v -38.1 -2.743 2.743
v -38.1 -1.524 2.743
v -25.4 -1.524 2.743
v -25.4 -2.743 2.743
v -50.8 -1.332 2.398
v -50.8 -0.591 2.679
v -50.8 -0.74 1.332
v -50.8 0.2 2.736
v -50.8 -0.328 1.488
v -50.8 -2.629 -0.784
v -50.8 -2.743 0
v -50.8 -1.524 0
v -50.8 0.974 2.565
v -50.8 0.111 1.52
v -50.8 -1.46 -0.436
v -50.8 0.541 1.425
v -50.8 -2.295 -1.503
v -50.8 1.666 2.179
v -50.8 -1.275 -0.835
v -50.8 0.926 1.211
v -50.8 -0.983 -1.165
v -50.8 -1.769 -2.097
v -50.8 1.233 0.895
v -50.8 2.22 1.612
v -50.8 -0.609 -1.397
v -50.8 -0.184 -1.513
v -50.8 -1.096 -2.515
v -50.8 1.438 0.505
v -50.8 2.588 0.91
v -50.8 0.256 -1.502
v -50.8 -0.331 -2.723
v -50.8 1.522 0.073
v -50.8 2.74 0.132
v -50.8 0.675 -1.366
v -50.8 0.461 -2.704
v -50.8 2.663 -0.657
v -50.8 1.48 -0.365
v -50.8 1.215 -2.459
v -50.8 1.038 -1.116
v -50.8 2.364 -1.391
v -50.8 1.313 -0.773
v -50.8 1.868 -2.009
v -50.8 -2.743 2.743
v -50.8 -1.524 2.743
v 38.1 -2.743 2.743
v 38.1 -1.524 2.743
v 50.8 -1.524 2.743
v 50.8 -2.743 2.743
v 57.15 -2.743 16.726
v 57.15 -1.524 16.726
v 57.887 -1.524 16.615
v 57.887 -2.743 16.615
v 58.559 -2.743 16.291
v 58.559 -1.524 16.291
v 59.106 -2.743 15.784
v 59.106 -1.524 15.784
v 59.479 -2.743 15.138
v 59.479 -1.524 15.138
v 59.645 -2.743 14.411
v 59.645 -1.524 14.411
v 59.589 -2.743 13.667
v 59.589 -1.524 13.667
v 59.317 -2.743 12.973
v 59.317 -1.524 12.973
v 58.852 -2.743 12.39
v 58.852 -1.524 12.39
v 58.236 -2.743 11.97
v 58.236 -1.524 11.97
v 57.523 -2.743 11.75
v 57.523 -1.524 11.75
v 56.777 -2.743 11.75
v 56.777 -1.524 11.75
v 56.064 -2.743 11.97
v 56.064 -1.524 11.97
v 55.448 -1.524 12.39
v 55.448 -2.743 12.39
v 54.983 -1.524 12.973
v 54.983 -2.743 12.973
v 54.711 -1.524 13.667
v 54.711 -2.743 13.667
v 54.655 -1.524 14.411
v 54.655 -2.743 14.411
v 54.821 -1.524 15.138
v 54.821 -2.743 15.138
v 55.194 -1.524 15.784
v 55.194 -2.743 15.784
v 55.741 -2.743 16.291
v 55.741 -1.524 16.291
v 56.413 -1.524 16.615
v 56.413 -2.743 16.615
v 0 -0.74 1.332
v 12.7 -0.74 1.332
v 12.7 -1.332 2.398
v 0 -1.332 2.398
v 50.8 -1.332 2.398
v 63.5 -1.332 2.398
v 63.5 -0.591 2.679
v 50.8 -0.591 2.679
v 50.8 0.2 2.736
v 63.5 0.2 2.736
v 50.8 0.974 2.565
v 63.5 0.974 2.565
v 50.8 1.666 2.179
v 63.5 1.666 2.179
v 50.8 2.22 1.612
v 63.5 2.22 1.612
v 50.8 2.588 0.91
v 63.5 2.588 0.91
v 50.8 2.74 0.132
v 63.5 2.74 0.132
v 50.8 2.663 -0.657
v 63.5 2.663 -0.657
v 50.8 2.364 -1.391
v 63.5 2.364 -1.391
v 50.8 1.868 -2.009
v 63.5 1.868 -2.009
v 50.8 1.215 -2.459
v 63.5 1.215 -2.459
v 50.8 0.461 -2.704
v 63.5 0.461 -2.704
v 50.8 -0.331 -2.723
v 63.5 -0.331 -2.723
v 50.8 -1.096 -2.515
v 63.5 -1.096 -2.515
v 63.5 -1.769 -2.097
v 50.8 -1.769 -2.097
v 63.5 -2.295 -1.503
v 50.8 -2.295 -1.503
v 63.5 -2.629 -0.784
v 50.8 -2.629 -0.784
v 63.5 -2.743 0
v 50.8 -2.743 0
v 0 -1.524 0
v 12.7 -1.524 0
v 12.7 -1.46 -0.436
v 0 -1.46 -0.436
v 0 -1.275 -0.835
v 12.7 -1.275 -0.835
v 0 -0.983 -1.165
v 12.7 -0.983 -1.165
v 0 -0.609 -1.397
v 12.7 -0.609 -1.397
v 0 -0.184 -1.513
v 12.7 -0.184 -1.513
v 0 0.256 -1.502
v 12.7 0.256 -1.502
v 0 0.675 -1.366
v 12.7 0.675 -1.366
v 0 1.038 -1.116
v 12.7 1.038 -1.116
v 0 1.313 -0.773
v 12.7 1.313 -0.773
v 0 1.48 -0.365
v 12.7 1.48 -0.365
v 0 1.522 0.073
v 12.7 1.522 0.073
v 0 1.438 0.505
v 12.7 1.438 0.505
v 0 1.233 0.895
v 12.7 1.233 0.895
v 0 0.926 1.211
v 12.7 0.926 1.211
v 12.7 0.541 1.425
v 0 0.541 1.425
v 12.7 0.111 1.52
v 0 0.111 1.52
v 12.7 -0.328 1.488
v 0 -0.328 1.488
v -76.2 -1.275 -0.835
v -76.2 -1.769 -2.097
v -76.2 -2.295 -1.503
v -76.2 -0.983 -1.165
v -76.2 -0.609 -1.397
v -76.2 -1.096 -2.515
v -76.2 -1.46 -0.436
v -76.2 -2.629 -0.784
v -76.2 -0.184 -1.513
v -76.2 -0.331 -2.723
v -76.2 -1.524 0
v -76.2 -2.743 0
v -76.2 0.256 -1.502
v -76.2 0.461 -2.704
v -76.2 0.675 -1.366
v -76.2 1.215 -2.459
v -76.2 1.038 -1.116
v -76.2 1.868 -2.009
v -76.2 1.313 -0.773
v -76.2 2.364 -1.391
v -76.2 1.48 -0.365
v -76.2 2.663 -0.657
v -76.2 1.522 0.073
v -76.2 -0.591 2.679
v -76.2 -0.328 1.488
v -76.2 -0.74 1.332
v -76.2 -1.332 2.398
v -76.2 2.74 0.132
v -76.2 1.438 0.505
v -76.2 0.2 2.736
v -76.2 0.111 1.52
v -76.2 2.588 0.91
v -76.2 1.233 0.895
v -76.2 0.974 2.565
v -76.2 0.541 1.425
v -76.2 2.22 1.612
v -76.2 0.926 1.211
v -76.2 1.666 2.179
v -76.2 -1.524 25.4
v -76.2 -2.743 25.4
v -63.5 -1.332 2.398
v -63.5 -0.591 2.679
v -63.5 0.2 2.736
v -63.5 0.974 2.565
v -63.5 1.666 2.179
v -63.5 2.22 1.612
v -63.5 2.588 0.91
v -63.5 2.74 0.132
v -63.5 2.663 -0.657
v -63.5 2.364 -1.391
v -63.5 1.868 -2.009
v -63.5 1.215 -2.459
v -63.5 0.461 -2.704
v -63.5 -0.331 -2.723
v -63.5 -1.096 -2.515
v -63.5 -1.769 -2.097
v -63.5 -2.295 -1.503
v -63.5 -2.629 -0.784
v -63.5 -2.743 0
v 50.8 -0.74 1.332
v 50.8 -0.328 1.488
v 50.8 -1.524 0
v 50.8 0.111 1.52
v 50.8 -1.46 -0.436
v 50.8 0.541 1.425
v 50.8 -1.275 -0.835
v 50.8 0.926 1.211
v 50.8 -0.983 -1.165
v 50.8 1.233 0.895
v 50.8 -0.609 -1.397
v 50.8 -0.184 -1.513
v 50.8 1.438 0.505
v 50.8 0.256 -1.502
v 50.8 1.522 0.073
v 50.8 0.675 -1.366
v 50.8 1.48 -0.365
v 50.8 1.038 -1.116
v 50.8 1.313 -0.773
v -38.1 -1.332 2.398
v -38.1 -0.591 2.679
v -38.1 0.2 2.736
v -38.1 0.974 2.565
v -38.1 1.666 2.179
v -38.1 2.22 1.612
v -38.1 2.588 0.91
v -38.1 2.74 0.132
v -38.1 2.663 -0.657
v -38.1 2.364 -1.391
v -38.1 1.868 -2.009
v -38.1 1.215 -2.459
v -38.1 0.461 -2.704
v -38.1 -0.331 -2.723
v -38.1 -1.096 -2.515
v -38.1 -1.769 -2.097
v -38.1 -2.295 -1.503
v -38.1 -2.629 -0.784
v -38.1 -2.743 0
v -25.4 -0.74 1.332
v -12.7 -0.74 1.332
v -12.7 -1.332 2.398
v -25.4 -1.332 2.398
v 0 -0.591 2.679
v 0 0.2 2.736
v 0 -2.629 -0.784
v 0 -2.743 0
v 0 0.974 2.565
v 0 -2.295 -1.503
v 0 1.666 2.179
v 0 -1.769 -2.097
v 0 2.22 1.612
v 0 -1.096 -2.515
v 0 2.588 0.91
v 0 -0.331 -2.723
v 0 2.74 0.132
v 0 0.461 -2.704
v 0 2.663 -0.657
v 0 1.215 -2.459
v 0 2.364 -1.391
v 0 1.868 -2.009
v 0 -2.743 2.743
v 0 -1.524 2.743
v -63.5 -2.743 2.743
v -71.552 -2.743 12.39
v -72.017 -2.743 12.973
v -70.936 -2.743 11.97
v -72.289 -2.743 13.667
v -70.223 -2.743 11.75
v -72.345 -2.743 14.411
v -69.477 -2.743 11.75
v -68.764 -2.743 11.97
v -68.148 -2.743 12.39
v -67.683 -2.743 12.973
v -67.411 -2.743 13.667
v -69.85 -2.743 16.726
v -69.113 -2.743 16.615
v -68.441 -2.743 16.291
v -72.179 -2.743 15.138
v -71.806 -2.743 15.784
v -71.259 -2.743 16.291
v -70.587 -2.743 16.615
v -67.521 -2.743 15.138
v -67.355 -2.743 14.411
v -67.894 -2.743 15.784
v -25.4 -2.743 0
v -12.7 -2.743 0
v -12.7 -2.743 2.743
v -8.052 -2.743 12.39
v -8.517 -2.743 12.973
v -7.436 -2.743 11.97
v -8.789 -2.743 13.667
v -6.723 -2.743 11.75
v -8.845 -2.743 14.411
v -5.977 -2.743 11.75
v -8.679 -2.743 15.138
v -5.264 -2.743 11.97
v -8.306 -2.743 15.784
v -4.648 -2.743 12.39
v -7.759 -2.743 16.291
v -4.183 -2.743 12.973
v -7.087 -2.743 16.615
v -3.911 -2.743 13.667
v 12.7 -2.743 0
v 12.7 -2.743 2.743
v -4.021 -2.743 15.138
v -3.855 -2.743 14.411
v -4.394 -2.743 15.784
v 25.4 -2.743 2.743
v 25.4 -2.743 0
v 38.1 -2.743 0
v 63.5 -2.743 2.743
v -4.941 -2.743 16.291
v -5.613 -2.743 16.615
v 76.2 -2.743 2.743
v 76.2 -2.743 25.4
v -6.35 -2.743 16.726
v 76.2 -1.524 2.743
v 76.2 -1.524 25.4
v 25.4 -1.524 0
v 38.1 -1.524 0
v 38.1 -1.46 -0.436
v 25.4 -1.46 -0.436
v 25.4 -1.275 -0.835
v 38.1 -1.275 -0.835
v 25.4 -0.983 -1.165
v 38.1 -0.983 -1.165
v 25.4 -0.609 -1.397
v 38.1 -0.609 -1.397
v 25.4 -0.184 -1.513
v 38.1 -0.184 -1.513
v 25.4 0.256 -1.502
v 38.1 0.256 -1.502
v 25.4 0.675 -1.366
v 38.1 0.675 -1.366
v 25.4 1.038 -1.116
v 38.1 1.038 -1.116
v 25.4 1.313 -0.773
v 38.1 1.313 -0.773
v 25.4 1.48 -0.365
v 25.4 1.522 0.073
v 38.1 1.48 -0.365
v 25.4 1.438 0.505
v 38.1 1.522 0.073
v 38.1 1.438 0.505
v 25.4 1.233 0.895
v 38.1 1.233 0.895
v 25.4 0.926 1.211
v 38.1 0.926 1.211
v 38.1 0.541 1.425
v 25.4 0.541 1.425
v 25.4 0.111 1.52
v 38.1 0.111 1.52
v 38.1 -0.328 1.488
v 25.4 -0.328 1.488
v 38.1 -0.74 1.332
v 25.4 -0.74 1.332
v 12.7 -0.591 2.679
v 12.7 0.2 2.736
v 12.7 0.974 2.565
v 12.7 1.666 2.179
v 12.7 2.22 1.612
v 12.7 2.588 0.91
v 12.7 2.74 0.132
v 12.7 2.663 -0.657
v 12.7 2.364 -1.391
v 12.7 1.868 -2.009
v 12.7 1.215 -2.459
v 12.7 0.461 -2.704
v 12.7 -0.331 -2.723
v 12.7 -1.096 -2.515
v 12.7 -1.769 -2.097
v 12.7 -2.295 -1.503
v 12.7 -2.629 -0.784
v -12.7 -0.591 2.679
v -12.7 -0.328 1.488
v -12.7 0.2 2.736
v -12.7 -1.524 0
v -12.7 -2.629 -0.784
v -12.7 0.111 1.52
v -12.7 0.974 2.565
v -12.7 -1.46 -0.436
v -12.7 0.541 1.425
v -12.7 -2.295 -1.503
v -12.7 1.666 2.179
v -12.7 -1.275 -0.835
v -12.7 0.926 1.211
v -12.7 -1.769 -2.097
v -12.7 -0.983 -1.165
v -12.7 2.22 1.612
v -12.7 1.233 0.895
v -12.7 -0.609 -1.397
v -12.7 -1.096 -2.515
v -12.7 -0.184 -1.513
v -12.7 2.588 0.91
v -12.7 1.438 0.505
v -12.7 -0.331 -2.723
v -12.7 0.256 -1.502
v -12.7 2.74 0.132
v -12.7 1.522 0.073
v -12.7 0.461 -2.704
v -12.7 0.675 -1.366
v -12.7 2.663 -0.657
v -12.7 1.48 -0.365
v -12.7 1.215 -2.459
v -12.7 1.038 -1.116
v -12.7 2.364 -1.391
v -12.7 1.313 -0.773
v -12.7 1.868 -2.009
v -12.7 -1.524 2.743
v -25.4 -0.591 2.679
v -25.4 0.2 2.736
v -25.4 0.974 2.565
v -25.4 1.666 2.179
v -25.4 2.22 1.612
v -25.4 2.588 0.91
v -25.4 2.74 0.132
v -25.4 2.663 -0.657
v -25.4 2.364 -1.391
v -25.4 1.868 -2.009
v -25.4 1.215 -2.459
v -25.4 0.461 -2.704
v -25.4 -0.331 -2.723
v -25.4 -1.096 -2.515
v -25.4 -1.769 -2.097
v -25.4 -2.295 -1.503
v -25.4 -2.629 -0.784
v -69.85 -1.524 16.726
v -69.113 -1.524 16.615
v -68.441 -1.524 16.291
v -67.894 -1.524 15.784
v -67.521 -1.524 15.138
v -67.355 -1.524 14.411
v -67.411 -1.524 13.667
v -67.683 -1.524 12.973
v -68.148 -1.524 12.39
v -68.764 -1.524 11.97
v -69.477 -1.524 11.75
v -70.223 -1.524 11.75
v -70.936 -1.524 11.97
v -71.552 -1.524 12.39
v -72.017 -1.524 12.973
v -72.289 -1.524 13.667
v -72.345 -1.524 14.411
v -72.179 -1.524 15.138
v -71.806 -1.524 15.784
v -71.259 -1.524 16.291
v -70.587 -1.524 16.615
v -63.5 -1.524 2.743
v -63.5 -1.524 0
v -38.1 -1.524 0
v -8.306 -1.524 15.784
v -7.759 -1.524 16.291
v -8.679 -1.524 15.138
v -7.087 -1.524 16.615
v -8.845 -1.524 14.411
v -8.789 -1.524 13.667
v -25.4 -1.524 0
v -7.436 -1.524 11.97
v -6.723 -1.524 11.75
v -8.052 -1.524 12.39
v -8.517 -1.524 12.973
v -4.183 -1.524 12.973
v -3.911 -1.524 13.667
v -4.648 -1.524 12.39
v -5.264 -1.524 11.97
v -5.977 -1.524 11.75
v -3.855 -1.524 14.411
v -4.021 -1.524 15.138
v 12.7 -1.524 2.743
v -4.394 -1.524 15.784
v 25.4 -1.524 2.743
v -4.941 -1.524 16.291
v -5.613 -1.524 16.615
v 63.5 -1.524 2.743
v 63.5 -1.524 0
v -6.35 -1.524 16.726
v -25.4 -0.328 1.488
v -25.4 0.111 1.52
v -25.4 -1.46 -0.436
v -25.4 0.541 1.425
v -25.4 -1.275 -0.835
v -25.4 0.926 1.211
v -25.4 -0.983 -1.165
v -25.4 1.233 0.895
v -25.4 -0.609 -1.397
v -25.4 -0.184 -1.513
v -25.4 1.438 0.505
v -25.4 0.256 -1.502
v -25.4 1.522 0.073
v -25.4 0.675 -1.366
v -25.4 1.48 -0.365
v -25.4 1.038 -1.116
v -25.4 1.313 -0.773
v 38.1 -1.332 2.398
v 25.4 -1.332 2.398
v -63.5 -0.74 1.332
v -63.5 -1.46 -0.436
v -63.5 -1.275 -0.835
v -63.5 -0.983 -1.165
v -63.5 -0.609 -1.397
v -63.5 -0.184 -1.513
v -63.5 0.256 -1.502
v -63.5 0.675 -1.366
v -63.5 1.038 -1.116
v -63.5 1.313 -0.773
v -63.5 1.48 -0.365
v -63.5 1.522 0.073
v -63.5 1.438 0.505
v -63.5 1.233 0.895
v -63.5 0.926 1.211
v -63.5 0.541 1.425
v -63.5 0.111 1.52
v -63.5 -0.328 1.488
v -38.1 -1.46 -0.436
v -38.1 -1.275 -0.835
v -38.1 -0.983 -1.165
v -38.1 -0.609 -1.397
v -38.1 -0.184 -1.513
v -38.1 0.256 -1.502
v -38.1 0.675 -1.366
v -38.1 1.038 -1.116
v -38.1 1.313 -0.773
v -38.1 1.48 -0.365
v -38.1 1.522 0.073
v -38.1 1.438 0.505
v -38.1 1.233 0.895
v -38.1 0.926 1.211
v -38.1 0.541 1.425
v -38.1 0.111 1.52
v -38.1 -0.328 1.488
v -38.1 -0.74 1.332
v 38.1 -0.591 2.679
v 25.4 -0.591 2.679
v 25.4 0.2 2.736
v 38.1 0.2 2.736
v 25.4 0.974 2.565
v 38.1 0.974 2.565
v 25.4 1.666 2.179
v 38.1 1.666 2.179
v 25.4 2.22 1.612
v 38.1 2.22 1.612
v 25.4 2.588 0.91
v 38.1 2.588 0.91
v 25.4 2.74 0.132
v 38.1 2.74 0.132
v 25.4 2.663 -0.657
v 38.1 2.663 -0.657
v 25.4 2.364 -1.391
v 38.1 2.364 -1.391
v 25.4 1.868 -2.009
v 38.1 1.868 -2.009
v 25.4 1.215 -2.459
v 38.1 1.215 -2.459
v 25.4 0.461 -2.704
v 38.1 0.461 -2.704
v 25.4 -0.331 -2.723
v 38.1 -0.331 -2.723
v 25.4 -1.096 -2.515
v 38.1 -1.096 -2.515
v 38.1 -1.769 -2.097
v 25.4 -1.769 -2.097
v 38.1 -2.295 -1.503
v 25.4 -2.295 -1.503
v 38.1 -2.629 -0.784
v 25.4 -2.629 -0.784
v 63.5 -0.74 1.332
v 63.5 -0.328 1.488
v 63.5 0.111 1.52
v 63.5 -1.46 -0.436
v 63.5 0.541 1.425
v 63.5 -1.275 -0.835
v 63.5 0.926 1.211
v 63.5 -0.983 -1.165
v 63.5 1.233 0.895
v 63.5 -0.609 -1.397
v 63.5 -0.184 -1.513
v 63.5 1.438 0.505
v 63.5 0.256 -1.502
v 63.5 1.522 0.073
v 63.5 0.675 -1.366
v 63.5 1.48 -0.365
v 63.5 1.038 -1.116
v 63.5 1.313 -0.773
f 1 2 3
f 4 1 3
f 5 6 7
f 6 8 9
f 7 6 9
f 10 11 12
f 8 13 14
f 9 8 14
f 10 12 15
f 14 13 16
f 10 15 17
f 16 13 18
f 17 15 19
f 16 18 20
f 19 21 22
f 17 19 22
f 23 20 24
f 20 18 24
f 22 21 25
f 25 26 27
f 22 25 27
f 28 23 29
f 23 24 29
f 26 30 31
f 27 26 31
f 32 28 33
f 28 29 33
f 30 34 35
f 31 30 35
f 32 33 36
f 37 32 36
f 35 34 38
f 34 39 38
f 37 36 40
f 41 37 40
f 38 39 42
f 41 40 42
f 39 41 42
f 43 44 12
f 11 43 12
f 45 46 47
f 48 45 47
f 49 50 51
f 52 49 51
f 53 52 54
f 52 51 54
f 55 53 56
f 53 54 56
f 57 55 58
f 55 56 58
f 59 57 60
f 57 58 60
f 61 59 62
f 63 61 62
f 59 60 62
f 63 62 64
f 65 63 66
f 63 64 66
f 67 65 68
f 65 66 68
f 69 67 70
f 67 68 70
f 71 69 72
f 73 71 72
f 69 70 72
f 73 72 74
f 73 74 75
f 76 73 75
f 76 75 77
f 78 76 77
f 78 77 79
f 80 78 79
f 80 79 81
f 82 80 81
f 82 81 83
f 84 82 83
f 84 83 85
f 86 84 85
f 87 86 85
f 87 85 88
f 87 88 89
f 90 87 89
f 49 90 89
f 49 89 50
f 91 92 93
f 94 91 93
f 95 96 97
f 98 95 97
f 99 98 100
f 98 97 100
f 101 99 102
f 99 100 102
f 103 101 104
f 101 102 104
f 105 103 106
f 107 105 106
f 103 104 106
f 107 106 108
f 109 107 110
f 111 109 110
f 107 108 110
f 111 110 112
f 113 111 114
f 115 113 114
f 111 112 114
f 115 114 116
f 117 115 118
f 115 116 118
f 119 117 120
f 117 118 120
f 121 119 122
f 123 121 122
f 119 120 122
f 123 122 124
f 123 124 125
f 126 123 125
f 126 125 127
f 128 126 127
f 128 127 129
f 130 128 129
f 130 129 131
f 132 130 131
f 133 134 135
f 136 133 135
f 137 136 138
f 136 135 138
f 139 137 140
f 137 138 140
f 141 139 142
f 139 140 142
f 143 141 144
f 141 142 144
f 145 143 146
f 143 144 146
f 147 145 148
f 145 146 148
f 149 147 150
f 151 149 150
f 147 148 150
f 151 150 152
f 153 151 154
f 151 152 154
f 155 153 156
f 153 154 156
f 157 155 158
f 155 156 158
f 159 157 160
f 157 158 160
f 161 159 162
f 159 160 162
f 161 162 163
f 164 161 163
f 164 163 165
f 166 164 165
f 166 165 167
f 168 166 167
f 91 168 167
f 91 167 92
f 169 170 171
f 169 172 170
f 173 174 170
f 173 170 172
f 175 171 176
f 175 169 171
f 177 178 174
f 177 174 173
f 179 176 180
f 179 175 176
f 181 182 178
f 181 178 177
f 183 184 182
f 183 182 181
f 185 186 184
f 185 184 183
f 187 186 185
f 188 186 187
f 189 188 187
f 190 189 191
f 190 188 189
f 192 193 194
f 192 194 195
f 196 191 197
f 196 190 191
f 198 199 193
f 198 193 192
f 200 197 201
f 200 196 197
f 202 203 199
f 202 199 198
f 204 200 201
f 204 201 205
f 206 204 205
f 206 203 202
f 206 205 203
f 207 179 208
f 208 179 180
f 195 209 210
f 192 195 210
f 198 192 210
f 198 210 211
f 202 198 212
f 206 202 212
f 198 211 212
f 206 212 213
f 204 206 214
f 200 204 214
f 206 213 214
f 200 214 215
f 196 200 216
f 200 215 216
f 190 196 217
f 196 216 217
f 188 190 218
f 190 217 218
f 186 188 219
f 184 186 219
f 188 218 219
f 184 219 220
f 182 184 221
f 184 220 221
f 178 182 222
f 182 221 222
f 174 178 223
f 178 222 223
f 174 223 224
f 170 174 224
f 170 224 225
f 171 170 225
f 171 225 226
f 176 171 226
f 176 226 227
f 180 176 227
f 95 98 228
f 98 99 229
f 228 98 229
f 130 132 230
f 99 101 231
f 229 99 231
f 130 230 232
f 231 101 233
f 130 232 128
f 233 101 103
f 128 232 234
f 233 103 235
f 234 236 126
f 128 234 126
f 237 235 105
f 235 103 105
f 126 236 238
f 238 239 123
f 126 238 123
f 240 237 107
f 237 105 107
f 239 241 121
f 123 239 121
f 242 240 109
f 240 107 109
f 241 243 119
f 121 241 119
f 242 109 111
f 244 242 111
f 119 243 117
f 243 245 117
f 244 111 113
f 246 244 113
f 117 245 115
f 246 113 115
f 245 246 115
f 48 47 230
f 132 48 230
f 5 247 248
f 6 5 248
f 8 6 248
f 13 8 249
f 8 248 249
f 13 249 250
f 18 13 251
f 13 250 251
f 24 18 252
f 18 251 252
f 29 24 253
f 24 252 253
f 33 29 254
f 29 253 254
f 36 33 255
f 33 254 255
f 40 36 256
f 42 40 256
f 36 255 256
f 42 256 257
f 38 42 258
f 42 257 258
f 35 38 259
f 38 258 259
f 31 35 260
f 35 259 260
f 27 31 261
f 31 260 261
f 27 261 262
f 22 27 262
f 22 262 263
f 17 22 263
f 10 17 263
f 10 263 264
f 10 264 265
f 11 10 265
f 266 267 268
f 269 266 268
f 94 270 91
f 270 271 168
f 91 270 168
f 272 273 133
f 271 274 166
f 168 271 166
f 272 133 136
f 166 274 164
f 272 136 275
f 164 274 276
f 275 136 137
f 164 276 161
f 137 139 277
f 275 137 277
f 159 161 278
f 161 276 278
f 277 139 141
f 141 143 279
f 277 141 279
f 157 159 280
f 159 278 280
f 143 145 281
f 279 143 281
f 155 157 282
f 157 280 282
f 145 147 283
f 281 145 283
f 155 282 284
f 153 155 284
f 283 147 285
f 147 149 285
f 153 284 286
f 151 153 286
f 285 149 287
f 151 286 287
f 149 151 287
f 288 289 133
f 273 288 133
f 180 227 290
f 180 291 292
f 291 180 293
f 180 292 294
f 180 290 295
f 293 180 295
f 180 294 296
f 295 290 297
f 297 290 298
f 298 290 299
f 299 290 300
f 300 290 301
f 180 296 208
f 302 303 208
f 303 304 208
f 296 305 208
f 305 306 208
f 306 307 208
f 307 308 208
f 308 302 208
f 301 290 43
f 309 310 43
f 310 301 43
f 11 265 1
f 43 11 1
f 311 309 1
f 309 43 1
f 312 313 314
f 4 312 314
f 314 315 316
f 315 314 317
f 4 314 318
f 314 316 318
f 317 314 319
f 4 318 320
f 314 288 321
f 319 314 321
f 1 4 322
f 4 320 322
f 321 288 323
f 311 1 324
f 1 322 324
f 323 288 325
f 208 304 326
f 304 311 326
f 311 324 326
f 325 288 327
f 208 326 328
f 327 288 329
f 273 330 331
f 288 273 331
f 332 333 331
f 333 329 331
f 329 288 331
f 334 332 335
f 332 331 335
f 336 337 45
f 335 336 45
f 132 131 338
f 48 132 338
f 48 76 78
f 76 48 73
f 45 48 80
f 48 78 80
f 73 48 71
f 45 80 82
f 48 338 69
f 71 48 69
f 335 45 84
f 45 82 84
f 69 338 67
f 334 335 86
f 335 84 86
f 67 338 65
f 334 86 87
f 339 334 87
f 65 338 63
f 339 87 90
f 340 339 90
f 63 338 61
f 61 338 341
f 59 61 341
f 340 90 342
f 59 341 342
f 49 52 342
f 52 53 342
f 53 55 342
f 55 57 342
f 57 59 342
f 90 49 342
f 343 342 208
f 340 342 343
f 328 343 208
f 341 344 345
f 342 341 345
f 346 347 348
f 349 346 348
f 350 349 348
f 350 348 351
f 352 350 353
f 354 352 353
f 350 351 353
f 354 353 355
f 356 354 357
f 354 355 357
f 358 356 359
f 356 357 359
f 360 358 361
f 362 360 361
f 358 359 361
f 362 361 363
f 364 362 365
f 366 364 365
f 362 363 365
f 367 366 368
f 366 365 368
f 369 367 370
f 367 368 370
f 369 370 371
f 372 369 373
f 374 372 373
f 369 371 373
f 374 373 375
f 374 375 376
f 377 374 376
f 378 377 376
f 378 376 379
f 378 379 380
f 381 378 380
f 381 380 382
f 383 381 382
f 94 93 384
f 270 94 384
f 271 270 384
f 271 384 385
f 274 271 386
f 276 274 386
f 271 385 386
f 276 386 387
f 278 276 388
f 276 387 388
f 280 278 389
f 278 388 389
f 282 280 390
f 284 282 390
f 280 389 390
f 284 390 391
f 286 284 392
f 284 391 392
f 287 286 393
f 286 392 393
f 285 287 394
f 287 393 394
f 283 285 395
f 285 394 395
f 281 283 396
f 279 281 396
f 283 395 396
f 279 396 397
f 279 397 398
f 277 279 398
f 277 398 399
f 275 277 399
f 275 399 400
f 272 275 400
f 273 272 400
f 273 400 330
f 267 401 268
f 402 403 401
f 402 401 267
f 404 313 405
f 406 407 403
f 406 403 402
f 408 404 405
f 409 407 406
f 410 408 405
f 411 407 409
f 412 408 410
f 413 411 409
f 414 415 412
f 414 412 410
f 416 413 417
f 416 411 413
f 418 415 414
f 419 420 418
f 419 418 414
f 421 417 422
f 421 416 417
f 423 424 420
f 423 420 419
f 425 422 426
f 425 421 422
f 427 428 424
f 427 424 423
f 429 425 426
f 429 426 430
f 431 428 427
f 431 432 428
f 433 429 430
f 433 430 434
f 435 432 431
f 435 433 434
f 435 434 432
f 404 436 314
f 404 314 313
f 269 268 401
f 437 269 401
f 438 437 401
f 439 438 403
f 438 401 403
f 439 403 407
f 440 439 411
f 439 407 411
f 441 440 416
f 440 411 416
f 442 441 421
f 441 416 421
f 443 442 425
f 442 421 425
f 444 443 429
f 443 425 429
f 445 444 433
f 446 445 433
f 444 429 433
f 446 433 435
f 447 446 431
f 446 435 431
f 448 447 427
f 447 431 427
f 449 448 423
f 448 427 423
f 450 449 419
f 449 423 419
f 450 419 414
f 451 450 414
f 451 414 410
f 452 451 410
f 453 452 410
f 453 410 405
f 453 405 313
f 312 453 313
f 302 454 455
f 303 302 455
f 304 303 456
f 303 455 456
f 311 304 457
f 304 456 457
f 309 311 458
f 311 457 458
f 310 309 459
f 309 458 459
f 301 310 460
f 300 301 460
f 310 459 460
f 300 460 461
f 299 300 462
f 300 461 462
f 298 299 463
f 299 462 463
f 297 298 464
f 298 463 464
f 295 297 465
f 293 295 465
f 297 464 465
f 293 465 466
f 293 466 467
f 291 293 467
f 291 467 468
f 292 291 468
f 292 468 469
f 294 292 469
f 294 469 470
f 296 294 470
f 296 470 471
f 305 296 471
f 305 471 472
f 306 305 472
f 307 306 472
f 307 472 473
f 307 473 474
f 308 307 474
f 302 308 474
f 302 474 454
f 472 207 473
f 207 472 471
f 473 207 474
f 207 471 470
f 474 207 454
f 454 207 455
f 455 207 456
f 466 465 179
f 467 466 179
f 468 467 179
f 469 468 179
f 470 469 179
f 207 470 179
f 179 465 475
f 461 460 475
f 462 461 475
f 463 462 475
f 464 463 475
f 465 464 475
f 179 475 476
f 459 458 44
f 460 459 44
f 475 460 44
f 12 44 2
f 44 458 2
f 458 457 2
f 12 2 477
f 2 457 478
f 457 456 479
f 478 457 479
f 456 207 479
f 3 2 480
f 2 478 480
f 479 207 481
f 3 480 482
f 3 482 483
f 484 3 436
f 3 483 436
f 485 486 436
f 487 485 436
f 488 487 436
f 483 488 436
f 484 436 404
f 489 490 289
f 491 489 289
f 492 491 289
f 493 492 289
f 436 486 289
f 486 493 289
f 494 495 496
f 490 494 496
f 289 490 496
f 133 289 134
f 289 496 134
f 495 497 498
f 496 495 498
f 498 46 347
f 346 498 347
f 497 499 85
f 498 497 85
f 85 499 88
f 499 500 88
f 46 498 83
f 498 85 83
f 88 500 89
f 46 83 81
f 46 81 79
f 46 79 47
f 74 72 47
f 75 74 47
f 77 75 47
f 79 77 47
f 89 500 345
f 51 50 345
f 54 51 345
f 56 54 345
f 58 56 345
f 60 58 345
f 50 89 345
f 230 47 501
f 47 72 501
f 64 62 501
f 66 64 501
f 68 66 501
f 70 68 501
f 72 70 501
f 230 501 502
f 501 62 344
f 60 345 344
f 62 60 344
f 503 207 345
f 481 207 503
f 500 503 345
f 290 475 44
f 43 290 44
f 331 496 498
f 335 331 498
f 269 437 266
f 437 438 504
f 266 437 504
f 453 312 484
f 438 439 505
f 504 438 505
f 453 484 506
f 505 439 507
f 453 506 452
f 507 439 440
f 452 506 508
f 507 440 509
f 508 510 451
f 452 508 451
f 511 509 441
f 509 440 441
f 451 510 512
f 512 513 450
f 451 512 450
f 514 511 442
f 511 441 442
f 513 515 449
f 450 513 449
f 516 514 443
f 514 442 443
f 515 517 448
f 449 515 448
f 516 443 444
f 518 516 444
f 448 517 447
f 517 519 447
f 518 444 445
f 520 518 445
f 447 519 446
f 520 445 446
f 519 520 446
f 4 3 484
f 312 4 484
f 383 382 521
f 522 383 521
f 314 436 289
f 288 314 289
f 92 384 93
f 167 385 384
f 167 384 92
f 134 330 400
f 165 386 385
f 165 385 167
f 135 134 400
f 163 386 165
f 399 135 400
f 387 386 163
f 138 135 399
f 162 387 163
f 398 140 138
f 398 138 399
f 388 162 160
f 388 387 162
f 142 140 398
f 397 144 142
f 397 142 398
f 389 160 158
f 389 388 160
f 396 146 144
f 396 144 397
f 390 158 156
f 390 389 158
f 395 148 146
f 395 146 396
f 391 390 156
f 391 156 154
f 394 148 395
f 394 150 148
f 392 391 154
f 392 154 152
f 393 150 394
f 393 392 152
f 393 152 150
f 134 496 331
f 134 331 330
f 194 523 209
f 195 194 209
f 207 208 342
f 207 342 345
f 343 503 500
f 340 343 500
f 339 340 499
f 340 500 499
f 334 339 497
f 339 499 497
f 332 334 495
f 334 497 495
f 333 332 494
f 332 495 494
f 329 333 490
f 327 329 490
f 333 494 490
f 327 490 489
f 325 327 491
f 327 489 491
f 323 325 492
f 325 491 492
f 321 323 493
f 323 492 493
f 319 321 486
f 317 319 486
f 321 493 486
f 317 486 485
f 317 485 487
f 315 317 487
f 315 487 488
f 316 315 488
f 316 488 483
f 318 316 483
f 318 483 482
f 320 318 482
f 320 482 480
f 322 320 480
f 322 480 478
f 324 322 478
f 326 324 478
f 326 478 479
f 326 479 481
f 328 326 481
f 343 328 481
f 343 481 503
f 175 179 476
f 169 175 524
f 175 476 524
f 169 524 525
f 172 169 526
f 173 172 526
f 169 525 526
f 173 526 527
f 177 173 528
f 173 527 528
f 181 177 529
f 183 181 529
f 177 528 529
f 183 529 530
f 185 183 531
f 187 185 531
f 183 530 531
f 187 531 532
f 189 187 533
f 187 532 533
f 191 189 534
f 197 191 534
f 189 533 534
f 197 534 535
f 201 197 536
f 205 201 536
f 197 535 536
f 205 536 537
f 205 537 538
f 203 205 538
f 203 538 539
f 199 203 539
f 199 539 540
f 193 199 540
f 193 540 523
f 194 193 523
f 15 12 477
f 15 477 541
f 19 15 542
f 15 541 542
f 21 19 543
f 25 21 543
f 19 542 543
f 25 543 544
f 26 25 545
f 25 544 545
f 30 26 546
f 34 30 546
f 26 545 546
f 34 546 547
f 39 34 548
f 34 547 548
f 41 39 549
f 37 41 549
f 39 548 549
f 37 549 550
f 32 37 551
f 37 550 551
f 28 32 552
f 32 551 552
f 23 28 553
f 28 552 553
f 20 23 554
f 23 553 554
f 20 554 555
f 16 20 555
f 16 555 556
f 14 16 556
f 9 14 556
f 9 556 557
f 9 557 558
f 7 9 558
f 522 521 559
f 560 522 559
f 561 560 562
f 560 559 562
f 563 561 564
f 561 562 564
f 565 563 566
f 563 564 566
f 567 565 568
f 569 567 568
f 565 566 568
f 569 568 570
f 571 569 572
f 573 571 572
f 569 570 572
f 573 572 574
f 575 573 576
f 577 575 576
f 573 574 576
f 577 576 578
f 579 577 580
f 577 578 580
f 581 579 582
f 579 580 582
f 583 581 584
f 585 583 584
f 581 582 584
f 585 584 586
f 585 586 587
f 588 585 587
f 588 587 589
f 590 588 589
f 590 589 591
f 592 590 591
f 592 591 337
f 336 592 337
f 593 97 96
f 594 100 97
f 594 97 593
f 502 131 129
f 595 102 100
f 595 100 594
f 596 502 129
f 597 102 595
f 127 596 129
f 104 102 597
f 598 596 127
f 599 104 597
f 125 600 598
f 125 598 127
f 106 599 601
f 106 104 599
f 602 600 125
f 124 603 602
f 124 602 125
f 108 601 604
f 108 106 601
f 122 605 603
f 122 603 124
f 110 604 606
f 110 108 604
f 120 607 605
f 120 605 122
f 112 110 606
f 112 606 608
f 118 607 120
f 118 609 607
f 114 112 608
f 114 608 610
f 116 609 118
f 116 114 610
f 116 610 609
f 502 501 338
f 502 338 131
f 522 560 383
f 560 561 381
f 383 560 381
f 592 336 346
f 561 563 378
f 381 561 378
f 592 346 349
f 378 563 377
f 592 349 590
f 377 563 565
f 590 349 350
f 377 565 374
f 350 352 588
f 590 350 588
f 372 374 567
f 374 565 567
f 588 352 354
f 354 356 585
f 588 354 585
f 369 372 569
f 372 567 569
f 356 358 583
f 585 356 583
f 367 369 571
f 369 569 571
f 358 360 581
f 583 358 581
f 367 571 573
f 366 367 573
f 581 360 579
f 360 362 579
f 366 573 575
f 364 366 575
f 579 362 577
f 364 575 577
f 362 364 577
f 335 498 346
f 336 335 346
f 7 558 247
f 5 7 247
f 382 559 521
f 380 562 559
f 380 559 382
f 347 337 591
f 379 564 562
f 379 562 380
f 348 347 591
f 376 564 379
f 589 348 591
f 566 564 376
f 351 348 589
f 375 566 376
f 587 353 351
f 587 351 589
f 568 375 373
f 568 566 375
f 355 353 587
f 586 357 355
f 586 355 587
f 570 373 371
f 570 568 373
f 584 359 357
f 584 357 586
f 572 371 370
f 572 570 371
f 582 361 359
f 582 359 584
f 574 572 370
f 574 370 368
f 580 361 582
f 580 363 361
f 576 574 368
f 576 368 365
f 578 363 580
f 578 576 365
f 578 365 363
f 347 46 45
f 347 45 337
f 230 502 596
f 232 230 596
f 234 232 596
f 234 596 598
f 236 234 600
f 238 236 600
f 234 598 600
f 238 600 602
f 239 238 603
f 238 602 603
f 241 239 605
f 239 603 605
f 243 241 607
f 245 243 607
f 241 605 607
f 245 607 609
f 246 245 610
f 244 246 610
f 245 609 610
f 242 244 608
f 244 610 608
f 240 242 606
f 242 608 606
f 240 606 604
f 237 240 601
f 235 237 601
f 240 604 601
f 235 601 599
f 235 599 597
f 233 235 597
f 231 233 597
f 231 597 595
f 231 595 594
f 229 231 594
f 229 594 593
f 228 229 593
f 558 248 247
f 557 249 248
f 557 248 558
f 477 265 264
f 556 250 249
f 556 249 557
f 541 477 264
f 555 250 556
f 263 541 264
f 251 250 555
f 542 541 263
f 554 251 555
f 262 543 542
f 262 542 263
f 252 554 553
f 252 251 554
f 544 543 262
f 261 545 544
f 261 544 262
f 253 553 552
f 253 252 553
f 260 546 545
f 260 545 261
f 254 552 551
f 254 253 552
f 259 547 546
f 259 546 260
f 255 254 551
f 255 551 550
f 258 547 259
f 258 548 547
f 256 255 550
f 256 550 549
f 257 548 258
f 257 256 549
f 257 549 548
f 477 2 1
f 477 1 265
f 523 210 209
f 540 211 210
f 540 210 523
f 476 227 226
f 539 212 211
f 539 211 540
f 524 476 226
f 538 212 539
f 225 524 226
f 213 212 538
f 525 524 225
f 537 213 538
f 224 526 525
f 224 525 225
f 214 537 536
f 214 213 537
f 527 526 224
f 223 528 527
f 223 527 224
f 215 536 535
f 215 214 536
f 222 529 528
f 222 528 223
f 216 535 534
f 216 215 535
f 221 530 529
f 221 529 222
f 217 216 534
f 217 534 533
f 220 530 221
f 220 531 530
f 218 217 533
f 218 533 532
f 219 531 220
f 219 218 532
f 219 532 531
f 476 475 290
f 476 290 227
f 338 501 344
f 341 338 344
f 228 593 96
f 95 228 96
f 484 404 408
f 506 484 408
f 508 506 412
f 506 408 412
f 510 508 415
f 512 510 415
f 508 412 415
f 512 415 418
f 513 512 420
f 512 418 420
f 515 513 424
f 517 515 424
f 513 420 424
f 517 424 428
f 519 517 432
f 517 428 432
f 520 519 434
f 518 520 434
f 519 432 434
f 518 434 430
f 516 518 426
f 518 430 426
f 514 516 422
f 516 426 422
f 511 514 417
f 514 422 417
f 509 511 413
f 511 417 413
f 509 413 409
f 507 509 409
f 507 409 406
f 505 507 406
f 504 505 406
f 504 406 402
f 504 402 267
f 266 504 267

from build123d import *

# Parameters (mm, degrees)
BOSS_EXTRUDE1_DEPTH = 76.2
SKETCH4_W           = 12.7
SKETCH4_H           = 5.4864
CUT_EXTRUDE1_DEPTH  = 81.368682621
LPATTERN1_COUNT     = 6
LPATTERN1_PITCH     = 25.4
SKETCH5_R           = 2.5019
CUT_EXTRUDE2_DEPTH  = 81.435122899


with BuildPart() as part:
    # Sketch3 → Boss-Extrude1 (new, symmetric)
    with BuildSketch(Plane(origin=(0, 0, 0), x_dir=(0, 0, -1), z_dir=(1, 0, 0))):
        with BuildLine():
            Line((0, -2.7432), (-25.4, -2.7432))
            Line((-25.4, -2.7432), (-25.4, -1.524))
            Line((-25.4, -1.524), (0, -1.524))
            ThreePointArc((0, -1.524), (0.77286266, 1.313491267), (-1.332215689, -0.740119827))
            Line((-1.332215689, -0.740119827), (-2.39798824, -1.332215689))
            ThreePointArc((-2.39798824, -1.332215689), (1.391152789, 2.36428428), (0, -2.7432))
        make_face()
    extrude(amount=BOSS_EXTRUDE1_DEPTH, both=True)

    # Sketch4 → Cut-Extrude1 (cut, symmetric)
    with BuildSketch(Plane(origin=(0, 0, 0), x_dir=(1, 0, 0), z_dir=(0, 1, 0))):
        with Locations((-57.15, 0)):
            Rectangle(SKETCH4_W, SKETCH4_H)
    cut_extrude1 = extrude(amount=CUT_EXTRUDE1_DEPTH, both=True, mode=Mode.SUBTRACT)

    # LPattern1: Cut-Extrude1 ×6
    with Locations(*[(i * LPATTERN1_PITCH, 0, 0) for i in range(1, LPATTERN1_COUNT)]):
        add(cut_extrude1, mode=Mode.SUBTRACT)

    # Sketch5 → Cut-Extrude2 (cut, through all)
    with BuildSketch(Plane(origin=(0, -1.524, 0), x_dir=(1, 0, 0), z_dir=(0, 1, 0))):
        with Locations(Location((57.15, -14.224, 0), (0, 0, 270))):
            Circle(SKETCH5_R)
        with Locations(Location((-6.35, -14.224, 0), (0, 0, 270))):
            Circle(SKETCH5_R)
        with Locations(Location((-69.85, -14.224, 0), (0, 0, 270))):
            Circle(SKETCH5_R)
    extrude(amount=-CUT_EXTRUDE2_DEPTH, mode=Mode.SUBTRACT)


solid = part.part
